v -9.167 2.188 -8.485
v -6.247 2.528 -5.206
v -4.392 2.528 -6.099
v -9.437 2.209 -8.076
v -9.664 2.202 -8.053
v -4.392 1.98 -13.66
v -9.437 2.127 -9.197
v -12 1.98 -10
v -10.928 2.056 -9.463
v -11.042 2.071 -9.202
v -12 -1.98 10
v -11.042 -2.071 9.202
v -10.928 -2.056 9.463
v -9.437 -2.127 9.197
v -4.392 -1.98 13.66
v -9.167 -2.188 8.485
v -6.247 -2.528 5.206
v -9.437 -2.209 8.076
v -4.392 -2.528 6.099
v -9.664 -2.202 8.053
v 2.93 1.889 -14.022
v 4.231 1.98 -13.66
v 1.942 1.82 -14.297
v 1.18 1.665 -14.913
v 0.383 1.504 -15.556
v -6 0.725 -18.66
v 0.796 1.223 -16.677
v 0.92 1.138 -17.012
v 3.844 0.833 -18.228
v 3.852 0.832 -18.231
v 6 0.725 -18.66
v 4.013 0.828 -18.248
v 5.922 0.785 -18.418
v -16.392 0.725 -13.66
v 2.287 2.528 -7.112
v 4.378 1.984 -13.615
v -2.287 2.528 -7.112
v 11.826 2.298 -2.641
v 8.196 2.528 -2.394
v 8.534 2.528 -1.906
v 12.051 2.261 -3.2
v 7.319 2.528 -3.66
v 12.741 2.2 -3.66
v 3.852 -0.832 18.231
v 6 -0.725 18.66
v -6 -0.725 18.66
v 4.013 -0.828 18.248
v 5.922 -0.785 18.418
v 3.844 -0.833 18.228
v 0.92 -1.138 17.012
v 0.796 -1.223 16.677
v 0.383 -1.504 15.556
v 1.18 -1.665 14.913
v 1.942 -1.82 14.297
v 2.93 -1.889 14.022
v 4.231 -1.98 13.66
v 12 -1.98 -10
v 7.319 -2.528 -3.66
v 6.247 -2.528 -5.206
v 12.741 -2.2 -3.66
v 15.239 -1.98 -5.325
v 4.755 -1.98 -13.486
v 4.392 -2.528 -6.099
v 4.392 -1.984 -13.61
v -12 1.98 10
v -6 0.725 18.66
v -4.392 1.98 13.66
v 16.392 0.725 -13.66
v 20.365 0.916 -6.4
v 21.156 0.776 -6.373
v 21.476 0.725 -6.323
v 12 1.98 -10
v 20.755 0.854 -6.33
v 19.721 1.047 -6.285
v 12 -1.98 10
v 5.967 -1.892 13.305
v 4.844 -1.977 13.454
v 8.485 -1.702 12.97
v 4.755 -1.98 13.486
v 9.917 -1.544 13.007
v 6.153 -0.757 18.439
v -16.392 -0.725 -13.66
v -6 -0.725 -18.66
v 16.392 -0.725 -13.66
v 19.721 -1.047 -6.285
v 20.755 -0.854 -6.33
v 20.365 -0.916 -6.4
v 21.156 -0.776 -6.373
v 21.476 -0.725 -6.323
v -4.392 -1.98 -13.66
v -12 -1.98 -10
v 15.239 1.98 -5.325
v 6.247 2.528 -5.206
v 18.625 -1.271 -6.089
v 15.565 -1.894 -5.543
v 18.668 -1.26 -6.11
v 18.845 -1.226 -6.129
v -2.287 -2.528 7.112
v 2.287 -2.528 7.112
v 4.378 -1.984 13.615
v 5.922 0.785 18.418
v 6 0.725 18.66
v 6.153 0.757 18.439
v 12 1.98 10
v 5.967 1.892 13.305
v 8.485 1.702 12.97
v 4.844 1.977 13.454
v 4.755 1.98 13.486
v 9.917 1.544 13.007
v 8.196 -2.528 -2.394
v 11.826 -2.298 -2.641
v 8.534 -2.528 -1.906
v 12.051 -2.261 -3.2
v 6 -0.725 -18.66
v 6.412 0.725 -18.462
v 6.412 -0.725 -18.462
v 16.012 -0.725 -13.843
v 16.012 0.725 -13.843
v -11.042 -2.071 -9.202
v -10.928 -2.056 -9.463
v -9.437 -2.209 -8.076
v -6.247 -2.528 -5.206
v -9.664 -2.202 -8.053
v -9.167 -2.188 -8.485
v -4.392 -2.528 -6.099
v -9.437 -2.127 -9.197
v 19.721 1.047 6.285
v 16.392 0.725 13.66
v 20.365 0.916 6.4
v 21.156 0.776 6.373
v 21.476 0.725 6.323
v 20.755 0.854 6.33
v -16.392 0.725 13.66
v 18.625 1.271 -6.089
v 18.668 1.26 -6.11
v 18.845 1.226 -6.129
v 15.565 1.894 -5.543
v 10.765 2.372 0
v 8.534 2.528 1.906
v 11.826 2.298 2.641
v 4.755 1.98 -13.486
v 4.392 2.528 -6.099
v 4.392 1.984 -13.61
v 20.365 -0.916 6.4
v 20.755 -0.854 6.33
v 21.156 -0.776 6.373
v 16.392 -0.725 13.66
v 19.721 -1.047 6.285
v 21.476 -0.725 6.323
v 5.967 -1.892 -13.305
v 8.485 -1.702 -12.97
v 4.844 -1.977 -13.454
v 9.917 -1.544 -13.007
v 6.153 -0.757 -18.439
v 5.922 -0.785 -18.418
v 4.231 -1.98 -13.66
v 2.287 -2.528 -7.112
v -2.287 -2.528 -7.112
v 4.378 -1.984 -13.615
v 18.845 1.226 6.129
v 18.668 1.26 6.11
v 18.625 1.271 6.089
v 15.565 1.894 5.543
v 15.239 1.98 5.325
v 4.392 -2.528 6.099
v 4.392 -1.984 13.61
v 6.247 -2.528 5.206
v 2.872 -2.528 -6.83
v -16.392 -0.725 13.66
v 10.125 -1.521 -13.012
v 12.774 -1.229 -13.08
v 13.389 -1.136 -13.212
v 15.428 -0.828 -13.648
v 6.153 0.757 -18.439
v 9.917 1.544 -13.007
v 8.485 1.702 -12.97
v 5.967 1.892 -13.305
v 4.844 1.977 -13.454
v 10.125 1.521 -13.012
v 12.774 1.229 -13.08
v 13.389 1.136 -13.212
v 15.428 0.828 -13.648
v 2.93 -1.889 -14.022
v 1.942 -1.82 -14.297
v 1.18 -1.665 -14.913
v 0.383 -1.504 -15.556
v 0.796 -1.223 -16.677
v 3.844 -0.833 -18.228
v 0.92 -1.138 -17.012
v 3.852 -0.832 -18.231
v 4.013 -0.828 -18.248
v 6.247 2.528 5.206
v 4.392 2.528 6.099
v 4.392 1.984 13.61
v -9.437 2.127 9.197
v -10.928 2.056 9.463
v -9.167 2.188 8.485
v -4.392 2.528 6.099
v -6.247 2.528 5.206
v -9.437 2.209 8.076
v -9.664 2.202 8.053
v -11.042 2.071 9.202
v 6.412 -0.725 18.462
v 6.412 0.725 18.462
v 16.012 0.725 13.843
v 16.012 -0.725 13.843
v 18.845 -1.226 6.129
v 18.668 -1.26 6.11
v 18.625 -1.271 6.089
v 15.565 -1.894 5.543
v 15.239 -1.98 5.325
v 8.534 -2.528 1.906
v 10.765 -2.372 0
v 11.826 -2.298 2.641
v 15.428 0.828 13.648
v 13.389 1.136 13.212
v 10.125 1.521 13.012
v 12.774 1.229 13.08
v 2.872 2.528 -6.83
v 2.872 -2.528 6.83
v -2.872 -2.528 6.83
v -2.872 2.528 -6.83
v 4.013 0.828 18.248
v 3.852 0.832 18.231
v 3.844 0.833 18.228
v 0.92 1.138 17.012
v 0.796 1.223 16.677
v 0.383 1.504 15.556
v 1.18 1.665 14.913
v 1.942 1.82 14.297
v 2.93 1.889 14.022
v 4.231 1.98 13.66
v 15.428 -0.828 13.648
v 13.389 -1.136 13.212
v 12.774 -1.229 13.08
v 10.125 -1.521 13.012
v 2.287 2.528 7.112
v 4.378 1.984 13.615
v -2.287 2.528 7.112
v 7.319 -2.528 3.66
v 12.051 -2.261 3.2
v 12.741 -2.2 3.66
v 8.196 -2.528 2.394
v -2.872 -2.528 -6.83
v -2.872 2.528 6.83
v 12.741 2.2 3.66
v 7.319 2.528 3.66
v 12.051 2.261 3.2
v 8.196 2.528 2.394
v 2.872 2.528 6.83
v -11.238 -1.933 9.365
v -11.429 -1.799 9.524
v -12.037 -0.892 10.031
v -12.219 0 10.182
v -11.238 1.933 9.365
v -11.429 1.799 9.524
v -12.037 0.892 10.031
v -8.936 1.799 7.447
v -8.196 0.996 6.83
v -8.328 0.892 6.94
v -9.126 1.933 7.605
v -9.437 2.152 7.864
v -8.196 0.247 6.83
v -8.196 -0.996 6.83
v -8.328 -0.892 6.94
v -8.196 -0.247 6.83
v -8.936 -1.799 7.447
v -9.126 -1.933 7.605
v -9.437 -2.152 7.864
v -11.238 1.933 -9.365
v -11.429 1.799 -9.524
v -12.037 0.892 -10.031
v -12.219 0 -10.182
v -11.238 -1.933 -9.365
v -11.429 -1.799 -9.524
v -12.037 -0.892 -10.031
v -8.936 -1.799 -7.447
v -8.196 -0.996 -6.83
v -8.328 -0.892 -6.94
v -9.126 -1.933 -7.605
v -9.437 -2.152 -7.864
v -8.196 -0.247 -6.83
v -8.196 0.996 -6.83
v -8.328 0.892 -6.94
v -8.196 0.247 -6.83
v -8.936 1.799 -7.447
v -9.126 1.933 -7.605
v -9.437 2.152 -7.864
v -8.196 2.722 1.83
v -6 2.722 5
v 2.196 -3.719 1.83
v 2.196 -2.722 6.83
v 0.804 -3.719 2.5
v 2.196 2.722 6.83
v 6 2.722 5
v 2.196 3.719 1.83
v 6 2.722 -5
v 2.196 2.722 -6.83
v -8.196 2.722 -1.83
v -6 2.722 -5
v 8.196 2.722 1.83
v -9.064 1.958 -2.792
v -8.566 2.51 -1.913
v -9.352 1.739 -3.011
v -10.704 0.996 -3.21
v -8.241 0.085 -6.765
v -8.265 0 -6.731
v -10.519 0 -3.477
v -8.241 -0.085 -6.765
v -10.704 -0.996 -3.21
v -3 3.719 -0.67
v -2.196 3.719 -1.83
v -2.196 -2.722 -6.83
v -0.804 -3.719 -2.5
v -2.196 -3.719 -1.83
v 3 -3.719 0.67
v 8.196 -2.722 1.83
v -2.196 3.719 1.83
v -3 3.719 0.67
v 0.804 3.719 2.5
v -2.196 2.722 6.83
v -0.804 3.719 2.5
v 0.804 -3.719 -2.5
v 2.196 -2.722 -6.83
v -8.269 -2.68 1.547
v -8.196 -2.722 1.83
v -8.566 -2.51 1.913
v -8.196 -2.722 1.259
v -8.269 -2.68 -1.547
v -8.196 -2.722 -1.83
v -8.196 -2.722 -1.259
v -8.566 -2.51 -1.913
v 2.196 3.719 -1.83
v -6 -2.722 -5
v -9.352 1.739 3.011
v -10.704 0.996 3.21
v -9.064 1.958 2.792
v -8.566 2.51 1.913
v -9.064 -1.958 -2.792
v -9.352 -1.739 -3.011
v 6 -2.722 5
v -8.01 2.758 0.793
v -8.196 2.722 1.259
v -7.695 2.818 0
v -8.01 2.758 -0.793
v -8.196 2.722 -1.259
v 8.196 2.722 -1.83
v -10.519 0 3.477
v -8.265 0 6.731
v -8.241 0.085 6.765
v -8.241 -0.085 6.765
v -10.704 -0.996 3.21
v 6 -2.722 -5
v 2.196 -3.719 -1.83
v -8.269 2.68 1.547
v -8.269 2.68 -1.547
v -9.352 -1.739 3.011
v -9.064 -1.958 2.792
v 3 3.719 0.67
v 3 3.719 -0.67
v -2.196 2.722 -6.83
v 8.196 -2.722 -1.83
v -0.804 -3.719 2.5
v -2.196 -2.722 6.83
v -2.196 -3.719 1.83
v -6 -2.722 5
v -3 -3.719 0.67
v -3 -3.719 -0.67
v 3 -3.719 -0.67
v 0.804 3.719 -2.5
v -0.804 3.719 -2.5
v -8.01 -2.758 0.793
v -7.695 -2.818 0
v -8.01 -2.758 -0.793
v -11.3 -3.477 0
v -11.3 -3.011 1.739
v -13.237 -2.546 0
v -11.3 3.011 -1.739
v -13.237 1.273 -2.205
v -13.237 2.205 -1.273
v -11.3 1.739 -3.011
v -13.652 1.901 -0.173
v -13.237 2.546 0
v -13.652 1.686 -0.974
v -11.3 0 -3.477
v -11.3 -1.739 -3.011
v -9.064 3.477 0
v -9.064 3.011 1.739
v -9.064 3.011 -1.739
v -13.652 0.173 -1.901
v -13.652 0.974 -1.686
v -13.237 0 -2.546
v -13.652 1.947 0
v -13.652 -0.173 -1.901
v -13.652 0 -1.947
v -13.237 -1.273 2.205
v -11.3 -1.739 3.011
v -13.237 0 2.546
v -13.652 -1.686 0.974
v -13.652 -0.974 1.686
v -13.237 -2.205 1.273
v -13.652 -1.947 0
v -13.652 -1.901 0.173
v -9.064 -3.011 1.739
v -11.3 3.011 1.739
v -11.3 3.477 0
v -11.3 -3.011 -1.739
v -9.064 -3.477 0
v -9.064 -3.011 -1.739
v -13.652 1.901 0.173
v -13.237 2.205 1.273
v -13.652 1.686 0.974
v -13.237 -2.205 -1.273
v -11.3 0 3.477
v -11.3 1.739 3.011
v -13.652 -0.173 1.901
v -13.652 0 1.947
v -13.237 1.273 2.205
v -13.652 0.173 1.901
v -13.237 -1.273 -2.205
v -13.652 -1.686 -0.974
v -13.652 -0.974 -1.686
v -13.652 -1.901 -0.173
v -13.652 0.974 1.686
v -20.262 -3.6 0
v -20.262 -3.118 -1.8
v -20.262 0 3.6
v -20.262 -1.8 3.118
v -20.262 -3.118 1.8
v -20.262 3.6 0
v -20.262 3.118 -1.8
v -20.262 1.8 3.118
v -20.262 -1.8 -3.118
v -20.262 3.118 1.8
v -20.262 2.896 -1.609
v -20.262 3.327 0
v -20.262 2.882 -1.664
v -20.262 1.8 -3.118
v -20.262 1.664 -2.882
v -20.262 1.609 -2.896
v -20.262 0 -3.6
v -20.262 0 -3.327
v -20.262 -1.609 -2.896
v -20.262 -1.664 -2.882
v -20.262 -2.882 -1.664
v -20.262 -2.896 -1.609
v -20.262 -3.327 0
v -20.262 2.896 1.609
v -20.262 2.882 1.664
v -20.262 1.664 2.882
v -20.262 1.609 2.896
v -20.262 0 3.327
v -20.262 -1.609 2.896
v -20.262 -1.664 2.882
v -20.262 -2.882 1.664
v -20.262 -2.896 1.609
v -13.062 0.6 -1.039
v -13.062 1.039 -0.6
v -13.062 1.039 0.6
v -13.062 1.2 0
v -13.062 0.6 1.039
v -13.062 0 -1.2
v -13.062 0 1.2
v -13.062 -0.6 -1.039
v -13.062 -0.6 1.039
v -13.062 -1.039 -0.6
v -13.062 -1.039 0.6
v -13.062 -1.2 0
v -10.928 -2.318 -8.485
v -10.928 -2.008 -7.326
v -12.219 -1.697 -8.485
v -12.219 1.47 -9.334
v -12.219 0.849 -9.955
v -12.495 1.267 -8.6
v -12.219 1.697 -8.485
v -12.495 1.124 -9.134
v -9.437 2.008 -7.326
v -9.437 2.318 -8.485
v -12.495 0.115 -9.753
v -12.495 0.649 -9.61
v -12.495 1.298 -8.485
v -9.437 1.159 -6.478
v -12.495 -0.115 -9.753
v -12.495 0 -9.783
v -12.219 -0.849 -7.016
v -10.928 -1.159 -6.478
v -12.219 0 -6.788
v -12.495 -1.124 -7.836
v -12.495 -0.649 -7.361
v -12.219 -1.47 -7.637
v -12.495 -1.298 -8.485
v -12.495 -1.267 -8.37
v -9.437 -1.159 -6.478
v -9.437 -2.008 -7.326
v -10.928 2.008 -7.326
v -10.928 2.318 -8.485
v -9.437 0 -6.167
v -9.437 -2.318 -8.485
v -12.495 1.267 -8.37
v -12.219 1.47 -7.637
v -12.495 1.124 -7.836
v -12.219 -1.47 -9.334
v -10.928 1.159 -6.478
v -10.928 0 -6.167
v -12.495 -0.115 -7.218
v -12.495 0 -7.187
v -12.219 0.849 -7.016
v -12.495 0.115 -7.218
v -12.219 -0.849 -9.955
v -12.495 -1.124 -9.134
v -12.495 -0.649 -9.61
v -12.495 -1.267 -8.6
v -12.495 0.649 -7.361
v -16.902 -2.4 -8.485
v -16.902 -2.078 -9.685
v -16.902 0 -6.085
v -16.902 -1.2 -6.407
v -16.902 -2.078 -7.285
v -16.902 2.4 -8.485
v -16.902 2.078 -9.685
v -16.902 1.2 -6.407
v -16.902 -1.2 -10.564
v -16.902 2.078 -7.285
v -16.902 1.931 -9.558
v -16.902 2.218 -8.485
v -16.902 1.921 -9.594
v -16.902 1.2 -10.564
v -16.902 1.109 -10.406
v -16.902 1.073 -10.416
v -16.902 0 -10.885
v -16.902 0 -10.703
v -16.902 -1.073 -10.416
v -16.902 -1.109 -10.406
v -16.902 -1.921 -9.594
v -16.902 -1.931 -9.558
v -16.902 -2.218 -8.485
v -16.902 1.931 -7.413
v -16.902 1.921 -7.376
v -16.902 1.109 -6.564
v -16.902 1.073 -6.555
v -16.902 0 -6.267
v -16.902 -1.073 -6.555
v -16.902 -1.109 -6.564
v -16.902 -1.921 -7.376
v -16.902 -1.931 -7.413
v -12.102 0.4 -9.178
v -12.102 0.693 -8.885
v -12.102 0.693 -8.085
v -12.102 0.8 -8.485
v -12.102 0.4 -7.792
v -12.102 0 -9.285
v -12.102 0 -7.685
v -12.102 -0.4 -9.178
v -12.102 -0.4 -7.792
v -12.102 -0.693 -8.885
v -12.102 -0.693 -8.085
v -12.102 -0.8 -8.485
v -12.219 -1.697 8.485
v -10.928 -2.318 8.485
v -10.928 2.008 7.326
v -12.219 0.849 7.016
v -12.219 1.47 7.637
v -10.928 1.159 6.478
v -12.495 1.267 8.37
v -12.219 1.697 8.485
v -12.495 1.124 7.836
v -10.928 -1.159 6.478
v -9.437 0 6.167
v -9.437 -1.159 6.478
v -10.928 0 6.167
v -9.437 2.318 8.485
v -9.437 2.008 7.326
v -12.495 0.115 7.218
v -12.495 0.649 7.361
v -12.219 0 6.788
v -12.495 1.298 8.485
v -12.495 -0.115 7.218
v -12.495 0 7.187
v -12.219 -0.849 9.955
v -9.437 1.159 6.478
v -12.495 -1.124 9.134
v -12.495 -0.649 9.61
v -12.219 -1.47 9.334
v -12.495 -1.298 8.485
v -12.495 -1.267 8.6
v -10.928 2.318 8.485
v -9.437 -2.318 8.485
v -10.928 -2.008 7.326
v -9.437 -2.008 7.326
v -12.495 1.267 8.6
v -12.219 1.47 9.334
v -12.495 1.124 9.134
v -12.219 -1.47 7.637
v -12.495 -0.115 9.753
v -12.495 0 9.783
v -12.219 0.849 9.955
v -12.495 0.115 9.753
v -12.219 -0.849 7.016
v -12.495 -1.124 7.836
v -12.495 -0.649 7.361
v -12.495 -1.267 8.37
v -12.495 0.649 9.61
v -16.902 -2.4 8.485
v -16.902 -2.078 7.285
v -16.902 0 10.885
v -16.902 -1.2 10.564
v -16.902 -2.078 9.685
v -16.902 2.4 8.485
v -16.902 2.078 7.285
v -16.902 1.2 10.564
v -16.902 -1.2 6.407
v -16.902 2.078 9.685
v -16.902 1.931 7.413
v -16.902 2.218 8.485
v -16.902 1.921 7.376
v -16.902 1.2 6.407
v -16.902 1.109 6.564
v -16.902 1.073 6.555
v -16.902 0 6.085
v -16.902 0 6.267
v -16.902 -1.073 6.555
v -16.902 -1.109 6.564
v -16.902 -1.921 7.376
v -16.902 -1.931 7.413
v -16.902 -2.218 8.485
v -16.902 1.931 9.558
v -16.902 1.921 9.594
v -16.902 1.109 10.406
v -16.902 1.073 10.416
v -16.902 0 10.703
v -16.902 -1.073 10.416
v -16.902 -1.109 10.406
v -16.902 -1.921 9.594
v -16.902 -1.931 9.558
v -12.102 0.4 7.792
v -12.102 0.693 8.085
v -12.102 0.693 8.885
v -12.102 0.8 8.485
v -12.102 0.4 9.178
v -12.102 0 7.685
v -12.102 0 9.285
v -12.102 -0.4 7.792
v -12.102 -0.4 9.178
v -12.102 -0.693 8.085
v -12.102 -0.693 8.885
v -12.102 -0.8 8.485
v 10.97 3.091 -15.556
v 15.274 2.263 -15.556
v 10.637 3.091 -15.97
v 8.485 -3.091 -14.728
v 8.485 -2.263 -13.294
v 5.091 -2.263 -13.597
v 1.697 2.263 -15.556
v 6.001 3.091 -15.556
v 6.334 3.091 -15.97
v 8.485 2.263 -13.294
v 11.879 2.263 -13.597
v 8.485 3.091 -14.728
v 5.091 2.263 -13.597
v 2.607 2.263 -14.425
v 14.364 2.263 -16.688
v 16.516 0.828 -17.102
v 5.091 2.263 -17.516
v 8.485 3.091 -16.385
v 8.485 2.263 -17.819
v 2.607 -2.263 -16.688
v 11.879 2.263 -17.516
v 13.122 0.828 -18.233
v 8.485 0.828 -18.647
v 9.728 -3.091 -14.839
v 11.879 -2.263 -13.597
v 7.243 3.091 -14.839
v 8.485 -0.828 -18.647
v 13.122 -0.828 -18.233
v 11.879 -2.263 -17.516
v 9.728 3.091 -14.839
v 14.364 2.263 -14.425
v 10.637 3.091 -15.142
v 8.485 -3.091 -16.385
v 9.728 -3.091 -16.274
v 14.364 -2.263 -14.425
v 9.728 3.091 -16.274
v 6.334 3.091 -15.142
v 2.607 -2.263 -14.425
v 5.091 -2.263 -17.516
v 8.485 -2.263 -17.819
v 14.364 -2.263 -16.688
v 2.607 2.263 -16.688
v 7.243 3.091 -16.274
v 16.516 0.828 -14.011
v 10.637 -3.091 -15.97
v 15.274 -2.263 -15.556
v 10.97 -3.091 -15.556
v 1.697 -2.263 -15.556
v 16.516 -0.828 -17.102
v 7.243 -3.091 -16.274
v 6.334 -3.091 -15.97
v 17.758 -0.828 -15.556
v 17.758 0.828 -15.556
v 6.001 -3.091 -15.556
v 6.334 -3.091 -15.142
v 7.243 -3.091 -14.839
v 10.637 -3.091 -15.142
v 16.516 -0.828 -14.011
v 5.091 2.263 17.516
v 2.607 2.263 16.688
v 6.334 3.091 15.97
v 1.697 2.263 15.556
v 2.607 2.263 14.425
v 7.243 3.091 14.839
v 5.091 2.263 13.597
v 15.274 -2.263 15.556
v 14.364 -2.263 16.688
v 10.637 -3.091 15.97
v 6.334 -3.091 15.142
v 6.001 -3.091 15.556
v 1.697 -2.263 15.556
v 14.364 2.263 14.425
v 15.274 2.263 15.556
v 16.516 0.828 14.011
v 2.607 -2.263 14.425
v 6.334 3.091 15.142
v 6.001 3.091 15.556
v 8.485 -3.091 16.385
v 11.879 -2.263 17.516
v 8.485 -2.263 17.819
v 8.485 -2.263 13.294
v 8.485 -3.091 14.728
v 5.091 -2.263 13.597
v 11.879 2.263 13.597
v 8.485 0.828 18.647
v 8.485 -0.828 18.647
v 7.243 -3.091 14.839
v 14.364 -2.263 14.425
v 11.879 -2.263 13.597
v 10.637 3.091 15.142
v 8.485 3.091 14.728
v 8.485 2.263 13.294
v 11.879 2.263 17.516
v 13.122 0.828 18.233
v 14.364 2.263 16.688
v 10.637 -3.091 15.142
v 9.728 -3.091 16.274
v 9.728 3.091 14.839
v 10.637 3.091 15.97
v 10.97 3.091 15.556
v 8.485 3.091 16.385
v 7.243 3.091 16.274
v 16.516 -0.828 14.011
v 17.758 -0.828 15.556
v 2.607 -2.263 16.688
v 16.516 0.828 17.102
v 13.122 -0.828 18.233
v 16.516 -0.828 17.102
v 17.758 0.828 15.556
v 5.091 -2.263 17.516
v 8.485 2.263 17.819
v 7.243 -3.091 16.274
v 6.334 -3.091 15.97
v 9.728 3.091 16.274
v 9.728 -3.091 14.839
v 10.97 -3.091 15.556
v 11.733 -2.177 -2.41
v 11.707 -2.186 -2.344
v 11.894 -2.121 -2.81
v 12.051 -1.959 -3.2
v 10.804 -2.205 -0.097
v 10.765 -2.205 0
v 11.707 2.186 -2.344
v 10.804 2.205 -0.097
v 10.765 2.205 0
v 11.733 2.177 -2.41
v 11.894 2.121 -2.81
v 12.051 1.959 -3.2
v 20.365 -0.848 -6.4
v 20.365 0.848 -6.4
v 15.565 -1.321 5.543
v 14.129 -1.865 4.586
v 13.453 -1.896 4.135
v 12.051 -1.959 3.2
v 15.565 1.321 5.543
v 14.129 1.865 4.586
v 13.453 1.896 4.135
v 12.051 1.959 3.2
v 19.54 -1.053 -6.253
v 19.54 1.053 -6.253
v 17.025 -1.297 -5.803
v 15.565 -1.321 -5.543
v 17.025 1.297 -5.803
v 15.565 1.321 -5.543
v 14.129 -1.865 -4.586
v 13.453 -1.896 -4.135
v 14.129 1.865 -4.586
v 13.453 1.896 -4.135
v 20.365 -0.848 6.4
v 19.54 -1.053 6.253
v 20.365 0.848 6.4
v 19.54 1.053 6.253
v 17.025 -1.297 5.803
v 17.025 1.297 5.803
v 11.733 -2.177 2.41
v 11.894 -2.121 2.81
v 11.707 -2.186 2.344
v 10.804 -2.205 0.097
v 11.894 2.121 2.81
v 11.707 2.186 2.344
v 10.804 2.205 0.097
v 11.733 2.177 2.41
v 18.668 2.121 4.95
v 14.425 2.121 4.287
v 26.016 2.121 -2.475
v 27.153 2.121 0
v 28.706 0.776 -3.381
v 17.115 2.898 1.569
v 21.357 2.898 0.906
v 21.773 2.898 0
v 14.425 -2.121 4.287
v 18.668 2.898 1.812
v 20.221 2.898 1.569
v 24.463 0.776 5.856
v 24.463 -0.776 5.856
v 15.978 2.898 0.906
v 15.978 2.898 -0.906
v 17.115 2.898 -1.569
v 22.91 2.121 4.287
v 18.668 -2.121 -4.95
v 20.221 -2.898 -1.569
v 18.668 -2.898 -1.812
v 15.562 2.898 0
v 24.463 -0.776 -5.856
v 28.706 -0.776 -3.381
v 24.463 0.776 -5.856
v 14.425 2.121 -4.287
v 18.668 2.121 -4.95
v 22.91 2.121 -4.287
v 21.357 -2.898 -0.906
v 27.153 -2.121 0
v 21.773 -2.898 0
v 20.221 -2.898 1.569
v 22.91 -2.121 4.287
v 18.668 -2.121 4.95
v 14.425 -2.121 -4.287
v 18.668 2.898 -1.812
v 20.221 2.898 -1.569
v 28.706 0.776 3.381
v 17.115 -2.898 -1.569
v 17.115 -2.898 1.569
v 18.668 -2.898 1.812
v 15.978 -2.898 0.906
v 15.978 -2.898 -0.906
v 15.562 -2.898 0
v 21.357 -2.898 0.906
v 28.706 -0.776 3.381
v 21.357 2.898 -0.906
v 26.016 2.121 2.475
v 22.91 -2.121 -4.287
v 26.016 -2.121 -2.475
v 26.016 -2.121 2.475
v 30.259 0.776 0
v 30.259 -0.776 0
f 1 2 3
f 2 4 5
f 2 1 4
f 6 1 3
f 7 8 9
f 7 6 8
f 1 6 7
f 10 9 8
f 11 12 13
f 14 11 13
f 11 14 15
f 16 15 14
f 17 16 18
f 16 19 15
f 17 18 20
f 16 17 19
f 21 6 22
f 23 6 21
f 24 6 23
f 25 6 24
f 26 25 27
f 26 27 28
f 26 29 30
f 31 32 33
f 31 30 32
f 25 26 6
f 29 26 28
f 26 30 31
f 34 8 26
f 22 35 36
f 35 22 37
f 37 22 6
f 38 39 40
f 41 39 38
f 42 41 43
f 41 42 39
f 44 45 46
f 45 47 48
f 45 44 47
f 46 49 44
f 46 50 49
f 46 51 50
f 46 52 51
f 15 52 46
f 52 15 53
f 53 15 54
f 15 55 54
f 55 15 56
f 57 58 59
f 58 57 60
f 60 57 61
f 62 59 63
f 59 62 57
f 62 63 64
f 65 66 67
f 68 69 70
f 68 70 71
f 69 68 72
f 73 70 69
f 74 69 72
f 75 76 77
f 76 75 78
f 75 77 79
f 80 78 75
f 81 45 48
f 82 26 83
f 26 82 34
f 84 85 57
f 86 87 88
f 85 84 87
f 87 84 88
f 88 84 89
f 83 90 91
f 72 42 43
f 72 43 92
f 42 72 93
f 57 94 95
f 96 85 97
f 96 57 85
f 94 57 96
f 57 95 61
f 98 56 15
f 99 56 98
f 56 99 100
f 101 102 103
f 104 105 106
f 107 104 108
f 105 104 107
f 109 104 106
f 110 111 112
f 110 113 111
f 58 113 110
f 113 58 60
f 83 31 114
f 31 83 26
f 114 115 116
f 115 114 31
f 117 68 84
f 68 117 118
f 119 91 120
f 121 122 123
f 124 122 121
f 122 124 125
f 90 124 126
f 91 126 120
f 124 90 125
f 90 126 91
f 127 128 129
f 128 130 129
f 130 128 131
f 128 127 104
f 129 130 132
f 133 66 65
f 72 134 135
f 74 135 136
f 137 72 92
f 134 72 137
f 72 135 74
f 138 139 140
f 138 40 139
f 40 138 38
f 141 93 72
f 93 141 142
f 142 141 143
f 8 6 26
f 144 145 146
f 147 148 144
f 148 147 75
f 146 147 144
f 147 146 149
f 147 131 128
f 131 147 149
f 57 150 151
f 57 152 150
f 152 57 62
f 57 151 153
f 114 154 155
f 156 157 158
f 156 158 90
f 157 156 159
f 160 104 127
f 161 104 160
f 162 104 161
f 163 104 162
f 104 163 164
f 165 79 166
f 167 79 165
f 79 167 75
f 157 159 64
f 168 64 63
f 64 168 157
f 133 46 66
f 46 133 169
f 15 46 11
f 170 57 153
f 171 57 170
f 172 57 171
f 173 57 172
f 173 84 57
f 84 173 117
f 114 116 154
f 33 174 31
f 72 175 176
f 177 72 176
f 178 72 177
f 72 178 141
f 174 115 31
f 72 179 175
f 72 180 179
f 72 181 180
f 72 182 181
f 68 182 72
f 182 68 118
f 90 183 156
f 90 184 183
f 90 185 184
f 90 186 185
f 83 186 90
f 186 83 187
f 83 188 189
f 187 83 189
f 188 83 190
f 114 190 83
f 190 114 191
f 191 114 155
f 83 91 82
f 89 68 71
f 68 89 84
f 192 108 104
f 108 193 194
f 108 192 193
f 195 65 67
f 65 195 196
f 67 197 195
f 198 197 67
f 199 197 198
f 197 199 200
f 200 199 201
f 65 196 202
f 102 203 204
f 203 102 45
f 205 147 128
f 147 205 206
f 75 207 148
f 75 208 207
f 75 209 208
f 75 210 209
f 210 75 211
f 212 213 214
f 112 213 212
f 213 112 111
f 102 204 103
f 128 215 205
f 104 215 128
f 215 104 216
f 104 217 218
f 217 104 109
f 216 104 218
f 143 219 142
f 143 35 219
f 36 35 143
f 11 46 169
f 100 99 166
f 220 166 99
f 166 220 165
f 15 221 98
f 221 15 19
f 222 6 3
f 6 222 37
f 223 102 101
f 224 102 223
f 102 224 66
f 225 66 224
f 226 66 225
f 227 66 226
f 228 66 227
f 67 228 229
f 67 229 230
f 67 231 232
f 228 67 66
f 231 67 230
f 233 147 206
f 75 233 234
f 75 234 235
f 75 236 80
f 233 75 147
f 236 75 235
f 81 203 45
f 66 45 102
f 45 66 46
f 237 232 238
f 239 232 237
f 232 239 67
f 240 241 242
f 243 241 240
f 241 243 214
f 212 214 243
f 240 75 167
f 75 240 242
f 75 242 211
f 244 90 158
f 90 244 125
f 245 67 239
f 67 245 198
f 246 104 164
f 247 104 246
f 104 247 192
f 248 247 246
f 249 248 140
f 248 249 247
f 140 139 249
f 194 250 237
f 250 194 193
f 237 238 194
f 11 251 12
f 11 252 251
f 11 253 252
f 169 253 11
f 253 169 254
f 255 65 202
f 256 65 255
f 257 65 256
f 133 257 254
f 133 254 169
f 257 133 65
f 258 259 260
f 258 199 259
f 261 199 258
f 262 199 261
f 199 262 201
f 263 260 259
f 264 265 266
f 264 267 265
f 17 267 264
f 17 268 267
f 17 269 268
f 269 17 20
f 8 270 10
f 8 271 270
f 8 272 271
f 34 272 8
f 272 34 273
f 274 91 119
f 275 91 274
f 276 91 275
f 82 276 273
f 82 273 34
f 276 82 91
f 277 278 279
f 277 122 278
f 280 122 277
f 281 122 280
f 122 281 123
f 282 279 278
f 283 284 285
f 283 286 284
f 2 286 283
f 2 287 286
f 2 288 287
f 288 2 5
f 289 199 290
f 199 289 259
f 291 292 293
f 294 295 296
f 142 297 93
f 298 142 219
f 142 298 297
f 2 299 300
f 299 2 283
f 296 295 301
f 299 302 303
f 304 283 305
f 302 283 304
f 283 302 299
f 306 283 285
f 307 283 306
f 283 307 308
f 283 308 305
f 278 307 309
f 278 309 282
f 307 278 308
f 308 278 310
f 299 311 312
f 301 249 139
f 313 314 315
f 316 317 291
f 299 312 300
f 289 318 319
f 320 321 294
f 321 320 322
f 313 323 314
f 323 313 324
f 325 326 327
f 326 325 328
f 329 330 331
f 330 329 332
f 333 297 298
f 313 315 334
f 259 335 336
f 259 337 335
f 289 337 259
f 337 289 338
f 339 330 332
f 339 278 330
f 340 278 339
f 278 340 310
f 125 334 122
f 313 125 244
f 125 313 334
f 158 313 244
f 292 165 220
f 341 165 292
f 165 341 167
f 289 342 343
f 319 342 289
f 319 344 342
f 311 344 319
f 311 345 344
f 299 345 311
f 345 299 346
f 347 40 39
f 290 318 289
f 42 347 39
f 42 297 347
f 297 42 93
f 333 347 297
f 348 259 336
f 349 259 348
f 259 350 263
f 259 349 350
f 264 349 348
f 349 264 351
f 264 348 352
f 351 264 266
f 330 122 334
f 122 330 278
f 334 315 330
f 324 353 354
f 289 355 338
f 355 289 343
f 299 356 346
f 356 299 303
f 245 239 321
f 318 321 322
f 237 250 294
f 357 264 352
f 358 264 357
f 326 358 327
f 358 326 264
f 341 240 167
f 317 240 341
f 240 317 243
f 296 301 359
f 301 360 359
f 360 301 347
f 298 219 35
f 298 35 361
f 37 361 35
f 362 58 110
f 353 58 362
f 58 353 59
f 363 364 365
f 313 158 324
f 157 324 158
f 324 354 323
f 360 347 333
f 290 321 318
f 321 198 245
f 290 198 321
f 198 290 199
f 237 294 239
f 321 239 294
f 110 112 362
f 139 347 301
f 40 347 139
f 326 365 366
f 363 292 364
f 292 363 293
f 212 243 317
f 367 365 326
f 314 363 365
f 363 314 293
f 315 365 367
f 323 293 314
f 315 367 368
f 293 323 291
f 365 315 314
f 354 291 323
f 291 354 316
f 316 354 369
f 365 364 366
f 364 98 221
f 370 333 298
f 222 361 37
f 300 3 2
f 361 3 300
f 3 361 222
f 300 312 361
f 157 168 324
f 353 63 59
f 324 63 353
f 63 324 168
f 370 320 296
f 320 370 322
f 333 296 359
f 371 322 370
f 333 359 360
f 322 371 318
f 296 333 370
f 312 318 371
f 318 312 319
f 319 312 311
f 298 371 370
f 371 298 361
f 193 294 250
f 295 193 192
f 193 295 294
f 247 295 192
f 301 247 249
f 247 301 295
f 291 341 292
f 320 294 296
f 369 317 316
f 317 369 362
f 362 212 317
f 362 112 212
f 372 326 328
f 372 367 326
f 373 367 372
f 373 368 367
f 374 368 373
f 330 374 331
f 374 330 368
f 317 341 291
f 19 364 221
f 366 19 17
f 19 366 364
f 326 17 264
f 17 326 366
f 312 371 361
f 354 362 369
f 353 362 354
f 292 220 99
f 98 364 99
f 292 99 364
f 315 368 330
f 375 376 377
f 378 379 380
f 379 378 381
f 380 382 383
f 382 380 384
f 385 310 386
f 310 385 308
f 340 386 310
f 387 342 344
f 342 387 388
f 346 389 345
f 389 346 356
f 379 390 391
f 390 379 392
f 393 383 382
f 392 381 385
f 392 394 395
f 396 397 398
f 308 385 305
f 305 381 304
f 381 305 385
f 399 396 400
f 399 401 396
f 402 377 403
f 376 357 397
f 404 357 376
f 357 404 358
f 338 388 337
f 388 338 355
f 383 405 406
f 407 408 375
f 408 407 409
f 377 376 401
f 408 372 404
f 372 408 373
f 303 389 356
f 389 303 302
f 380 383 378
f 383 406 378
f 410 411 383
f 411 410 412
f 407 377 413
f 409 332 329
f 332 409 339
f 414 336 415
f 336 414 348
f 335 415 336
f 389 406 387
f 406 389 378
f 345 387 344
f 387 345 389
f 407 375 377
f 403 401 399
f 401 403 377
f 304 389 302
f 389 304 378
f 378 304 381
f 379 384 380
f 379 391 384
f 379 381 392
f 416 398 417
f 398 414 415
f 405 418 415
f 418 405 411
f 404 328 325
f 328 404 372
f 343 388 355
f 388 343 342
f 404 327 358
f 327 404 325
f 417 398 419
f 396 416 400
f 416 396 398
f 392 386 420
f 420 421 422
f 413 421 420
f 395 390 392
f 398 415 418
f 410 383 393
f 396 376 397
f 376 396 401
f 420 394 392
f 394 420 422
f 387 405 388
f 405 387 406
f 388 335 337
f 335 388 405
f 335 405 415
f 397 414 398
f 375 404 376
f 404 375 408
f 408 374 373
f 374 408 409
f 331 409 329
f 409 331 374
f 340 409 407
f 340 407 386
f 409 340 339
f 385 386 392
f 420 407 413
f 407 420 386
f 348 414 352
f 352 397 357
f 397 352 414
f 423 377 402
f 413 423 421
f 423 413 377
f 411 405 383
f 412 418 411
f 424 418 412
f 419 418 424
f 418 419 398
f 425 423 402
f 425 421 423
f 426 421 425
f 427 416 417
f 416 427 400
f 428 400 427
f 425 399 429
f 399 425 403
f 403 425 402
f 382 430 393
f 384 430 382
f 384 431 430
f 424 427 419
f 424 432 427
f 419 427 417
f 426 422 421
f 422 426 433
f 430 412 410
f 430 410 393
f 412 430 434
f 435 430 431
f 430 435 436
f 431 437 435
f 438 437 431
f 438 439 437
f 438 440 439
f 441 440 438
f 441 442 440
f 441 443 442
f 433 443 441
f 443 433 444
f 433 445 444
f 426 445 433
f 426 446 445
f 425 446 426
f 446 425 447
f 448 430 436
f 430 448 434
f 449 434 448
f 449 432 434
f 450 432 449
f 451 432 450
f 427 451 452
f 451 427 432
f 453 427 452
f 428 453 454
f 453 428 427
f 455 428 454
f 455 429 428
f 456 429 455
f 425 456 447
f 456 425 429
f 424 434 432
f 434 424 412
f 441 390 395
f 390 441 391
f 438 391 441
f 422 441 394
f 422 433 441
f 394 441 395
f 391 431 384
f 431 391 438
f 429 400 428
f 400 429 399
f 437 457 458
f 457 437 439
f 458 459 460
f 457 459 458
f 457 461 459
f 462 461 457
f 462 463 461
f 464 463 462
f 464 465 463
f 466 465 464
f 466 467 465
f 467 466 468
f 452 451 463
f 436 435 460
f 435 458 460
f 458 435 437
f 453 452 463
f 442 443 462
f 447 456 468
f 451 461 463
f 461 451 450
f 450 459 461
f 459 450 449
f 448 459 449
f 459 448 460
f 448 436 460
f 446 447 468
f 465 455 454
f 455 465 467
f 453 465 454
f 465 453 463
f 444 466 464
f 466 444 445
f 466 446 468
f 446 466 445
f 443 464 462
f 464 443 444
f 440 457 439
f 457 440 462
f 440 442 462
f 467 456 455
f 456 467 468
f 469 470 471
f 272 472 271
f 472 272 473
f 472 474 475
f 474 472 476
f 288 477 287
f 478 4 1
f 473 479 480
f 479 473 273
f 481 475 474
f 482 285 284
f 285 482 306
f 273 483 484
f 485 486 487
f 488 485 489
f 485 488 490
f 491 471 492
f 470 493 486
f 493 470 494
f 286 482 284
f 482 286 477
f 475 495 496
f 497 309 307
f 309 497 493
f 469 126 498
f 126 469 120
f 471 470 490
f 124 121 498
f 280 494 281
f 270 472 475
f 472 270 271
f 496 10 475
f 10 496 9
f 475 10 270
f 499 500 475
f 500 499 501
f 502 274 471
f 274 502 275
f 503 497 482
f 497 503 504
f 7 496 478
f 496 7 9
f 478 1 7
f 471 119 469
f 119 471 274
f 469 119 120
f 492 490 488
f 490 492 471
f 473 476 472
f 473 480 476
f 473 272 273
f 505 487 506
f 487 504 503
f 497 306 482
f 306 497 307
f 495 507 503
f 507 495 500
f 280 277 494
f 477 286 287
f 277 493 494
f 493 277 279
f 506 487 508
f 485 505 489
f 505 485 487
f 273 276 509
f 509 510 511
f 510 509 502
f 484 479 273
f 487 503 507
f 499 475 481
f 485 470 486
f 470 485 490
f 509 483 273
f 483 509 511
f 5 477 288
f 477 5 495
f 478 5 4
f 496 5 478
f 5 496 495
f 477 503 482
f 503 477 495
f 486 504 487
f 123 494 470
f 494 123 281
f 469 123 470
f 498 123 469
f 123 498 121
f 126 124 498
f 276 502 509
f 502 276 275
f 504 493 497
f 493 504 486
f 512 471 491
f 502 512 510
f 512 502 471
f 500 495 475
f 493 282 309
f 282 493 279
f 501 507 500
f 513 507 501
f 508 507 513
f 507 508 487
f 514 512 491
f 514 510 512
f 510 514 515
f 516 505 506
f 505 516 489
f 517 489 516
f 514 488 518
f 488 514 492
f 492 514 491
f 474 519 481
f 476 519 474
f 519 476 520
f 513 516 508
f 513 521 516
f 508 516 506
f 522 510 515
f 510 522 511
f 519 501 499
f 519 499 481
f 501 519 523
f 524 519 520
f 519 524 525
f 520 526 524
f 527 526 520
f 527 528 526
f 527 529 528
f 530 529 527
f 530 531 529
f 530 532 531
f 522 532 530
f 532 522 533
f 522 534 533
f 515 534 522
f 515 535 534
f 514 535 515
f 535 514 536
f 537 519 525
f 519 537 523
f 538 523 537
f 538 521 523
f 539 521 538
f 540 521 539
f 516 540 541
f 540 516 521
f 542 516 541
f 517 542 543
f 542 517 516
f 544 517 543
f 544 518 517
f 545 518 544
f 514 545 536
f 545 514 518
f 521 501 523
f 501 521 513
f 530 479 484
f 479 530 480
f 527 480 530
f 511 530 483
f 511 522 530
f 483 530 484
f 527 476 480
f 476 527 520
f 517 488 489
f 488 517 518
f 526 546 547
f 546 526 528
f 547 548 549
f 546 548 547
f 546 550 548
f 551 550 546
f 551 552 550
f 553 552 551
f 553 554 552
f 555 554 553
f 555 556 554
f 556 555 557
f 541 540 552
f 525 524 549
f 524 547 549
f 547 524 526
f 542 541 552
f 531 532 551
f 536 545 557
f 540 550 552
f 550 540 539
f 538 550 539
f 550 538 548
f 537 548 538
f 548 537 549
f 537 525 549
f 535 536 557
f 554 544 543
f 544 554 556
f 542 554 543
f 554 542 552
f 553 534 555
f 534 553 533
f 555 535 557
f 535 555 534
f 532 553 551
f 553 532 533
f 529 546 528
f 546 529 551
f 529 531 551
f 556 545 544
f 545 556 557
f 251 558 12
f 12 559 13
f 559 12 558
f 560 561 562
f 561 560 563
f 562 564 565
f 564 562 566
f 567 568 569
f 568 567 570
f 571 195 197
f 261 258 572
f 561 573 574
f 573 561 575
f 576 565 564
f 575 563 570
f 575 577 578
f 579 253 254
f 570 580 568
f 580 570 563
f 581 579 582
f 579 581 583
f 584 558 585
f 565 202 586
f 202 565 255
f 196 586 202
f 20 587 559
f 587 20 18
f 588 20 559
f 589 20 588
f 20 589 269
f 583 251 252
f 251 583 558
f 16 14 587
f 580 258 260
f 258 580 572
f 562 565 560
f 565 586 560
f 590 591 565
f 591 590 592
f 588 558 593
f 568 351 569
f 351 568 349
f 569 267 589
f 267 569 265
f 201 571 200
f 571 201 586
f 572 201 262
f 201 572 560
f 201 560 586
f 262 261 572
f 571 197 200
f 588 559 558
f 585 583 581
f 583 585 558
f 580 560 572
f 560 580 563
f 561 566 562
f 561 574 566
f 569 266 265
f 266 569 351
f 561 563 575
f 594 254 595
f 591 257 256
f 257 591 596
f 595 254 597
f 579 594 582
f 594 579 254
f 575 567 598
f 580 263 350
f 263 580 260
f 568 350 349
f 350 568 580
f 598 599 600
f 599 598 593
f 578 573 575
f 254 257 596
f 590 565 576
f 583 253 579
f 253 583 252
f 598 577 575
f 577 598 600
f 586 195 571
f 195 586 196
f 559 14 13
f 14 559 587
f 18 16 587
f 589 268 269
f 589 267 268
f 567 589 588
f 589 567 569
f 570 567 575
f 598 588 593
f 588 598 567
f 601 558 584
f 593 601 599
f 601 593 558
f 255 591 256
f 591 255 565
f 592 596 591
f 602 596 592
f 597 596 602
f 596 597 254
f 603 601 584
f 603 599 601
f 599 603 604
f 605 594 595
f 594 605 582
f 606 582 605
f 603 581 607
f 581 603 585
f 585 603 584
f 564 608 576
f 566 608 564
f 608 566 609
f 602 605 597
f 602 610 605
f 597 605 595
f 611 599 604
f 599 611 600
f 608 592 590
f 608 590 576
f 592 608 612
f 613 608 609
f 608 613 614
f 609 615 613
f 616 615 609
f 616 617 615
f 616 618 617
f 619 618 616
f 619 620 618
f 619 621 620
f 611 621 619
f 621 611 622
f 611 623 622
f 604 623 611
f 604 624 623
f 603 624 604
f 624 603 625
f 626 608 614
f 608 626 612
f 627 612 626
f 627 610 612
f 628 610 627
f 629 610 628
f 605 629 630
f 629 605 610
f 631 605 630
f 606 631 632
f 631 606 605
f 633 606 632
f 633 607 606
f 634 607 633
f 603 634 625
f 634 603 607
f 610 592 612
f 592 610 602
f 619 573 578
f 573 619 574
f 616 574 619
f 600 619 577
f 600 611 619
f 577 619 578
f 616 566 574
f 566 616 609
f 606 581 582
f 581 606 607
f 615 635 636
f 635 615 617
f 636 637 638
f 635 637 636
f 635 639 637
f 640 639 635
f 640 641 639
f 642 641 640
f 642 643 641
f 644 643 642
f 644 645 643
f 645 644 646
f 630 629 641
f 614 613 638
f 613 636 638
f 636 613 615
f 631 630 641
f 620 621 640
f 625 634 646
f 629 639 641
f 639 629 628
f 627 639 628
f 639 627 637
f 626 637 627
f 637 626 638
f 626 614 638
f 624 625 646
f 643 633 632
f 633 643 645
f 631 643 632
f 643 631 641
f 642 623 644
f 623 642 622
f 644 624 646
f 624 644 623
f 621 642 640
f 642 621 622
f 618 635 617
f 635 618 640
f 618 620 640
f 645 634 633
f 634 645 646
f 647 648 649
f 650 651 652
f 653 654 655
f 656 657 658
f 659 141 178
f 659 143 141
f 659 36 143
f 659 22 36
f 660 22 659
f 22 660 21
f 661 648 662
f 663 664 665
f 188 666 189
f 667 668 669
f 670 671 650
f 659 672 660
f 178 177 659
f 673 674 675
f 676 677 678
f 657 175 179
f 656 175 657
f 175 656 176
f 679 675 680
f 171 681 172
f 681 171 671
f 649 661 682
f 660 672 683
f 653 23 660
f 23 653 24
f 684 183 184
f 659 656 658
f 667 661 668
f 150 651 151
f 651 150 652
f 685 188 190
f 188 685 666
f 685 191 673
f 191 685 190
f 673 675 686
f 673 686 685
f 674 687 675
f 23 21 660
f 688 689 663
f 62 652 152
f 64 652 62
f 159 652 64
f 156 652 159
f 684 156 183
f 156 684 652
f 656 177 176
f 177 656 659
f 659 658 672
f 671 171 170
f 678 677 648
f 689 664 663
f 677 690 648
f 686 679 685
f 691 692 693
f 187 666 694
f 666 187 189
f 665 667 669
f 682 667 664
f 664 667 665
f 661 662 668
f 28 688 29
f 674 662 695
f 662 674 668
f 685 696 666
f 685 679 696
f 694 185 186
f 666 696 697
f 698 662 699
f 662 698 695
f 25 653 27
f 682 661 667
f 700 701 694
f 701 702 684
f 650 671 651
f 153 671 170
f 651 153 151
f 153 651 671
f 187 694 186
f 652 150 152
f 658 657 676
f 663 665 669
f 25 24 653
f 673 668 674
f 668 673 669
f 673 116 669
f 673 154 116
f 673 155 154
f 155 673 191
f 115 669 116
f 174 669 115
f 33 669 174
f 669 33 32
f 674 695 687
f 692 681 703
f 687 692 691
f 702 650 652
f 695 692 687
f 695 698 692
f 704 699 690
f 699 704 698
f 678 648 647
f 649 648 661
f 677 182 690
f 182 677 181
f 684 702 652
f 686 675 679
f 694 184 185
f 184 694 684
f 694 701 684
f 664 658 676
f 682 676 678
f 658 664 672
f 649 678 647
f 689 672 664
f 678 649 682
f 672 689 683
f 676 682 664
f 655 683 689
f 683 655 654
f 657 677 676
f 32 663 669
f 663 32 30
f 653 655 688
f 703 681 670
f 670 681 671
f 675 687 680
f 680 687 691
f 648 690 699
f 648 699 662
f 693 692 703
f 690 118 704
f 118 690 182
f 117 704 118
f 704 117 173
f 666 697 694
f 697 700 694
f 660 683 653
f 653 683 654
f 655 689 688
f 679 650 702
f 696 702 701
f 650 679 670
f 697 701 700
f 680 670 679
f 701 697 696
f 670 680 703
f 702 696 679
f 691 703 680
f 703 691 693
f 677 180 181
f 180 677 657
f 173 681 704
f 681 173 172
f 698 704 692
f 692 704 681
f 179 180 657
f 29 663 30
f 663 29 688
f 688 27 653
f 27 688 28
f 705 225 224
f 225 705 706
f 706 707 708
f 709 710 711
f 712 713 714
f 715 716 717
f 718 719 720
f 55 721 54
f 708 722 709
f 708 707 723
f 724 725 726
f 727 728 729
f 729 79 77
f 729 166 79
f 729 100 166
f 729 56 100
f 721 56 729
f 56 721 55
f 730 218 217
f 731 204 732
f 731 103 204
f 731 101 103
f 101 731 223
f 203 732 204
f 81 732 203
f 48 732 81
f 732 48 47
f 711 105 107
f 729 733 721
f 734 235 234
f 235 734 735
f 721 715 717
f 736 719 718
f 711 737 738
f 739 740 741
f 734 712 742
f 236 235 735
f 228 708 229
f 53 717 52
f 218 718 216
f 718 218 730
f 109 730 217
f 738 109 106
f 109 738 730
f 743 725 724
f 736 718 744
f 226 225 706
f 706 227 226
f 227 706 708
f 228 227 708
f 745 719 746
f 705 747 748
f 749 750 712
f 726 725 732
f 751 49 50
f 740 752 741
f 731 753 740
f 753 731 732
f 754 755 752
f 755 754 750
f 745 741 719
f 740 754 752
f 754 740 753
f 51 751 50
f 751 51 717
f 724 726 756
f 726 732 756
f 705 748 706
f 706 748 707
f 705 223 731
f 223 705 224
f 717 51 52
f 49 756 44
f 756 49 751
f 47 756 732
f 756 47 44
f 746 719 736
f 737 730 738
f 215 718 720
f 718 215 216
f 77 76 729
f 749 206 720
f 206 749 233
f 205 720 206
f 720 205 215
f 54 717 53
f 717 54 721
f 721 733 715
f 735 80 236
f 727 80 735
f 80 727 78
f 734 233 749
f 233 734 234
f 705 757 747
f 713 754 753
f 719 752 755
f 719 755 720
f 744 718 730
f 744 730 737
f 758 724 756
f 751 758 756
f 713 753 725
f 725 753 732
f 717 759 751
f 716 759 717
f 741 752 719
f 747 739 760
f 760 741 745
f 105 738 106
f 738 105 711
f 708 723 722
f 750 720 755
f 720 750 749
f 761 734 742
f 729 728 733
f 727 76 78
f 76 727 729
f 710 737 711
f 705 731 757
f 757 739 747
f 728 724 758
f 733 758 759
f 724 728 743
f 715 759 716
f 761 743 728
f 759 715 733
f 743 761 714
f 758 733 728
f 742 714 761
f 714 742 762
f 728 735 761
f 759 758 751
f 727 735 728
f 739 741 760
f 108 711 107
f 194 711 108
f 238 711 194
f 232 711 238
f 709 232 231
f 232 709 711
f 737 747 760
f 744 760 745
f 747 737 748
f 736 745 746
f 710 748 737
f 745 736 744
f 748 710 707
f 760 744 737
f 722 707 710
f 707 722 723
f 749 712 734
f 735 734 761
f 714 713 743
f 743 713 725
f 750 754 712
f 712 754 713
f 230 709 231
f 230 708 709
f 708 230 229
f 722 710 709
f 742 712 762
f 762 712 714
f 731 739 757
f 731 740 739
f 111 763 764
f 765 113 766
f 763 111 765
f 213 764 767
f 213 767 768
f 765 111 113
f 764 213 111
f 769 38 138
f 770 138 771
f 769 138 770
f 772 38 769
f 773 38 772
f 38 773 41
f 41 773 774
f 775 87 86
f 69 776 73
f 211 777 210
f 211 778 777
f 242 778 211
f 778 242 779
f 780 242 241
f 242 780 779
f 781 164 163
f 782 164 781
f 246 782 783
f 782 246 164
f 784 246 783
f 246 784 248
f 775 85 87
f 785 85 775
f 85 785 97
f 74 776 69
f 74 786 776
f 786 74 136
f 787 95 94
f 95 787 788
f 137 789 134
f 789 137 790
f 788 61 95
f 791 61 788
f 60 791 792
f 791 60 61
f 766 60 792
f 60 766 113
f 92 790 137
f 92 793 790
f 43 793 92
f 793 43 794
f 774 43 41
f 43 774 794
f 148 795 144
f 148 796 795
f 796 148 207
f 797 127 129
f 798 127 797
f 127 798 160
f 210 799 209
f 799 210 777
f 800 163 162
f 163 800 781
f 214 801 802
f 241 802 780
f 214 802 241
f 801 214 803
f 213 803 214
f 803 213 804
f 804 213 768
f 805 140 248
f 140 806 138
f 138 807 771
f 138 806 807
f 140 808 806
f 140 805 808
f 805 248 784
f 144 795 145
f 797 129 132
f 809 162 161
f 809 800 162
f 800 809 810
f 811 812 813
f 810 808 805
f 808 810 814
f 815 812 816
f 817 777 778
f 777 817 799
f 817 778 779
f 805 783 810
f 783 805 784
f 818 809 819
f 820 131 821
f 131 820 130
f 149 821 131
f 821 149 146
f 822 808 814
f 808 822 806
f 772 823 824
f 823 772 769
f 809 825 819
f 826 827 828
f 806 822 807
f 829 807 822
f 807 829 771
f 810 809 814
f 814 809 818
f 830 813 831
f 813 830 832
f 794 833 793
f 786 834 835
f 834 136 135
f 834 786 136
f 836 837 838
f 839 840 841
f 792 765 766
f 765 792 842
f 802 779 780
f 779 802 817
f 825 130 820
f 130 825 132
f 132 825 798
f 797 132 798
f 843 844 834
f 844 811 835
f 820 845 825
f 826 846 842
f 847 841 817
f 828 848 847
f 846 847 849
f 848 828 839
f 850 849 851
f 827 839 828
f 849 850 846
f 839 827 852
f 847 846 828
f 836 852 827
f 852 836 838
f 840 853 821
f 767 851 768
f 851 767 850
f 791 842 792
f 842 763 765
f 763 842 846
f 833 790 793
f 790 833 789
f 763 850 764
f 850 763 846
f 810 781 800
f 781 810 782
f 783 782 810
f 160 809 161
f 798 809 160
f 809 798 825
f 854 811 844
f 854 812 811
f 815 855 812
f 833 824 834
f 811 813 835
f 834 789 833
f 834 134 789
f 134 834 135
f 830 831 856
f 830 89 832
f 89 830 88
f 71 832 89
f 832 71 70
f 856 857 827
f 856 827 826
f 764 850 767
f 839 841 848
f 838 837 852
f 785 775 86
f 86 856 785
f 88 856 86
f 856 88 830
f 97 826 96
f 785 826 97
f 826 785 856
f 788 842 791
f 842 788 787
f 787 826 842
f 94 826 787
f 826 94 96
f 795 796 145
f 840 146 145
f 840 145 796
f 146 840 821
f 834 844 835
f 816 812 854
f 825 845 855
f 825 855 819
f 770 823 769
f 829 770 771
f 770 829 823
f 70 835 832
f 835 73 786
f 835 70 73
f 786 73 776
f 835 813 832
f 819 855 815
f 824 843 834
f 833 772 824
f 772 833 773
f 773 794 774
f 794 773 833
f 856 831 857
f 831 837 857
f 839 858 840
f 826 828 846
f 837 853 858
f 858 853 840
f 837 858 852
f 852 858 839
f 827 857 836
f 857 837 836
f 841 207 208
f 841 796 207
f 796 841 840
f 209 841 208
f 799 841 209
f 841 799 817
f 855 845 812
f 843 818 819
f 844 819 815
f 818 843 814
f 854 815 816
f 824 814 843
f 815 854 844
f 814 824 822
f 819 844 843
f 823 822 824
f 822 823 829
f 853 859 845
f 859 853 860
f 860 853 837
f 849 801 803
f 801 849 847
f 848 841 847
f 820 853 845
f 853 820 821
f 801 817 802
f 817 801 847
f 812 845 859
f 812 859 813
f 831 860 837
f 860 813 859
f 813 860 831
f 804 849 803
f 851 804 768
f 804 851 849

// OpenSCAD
$fn=12;


module engine()
{
	rotate(a = -90 - 45, v = [0, 0, 1])
	rotate(a = -90, v = [0, 1, 0])
	scale(v = [0.25, 0.25, 0.25])
	difference() {
		union() {
			sphere(r = 6);
			translate(v = [0, 0, 4])
				cylinder(h = 10, r1 = 3, r2 = 6);
		}
		translate(v = [0, 0, 4])
			cylinder(h = 11, r1 = 2, r2 = 5.9);
	}
}

module pod()
{
	rotate(a = 45, v = [0, 0, 1])
		scale(v = [2, 0.8, 0.8])
			sphere(r = 2, center = true);
}

module body()
{
	scale(v = [1, 1, 0.7]) {
		difference() {
			union() {
				scale(v = [1, 1, 0.2])
					sphere(r = 10, center = true);
			}
			translate(v = [5, 5, 0])
				cube(size = [10, 10, 10], center = true);
		}
		scale(v = [1, 1, 0.55])
			sphere(r = 5, center = true);
	}
	translate(v = [3, 3, 0])
		scale(v = [1.2, 1.2, 1.2])
			engine();
	translate(v = [6, 0, 0])
		scale(v = [0.8, 0.8, 0.8])
			engine();
	translate(v = [0, 6, 0])
		scale(v = [0.8, 0.8, 0.8])
			engine();
	translate(v = [3, -8, 0])
		pod();
	translate(v = [-8, 3, 0])
		pod();
}

module divot()
{
	translate(v = [-6, -6, 0])
	rotate(a = -45, v = [0, 0, 1])
		scale(v = [0.8, 1, 1])
			cylinder(h = 9, r1 = 4, r2 = 4, center = true);
}

module swordfish()
{
	difference() {
		body();
		divot();
	}

	translate(v = [-5.5, -5.5, 0])
		rotate(a = 45, v = [0, 0, 1])
		scale(v = [1, 0.7, 0.3])
			sphere(r = 5, center = true);
}

scale(v = [2.4, 2.0, 2.0])
rotate(a = 90, v = [0, 0, 1])
rotate(a = 90, v = [0, 1, 0])
rotate(a = 45, v = [0, 0, 1])
	swordfish();
